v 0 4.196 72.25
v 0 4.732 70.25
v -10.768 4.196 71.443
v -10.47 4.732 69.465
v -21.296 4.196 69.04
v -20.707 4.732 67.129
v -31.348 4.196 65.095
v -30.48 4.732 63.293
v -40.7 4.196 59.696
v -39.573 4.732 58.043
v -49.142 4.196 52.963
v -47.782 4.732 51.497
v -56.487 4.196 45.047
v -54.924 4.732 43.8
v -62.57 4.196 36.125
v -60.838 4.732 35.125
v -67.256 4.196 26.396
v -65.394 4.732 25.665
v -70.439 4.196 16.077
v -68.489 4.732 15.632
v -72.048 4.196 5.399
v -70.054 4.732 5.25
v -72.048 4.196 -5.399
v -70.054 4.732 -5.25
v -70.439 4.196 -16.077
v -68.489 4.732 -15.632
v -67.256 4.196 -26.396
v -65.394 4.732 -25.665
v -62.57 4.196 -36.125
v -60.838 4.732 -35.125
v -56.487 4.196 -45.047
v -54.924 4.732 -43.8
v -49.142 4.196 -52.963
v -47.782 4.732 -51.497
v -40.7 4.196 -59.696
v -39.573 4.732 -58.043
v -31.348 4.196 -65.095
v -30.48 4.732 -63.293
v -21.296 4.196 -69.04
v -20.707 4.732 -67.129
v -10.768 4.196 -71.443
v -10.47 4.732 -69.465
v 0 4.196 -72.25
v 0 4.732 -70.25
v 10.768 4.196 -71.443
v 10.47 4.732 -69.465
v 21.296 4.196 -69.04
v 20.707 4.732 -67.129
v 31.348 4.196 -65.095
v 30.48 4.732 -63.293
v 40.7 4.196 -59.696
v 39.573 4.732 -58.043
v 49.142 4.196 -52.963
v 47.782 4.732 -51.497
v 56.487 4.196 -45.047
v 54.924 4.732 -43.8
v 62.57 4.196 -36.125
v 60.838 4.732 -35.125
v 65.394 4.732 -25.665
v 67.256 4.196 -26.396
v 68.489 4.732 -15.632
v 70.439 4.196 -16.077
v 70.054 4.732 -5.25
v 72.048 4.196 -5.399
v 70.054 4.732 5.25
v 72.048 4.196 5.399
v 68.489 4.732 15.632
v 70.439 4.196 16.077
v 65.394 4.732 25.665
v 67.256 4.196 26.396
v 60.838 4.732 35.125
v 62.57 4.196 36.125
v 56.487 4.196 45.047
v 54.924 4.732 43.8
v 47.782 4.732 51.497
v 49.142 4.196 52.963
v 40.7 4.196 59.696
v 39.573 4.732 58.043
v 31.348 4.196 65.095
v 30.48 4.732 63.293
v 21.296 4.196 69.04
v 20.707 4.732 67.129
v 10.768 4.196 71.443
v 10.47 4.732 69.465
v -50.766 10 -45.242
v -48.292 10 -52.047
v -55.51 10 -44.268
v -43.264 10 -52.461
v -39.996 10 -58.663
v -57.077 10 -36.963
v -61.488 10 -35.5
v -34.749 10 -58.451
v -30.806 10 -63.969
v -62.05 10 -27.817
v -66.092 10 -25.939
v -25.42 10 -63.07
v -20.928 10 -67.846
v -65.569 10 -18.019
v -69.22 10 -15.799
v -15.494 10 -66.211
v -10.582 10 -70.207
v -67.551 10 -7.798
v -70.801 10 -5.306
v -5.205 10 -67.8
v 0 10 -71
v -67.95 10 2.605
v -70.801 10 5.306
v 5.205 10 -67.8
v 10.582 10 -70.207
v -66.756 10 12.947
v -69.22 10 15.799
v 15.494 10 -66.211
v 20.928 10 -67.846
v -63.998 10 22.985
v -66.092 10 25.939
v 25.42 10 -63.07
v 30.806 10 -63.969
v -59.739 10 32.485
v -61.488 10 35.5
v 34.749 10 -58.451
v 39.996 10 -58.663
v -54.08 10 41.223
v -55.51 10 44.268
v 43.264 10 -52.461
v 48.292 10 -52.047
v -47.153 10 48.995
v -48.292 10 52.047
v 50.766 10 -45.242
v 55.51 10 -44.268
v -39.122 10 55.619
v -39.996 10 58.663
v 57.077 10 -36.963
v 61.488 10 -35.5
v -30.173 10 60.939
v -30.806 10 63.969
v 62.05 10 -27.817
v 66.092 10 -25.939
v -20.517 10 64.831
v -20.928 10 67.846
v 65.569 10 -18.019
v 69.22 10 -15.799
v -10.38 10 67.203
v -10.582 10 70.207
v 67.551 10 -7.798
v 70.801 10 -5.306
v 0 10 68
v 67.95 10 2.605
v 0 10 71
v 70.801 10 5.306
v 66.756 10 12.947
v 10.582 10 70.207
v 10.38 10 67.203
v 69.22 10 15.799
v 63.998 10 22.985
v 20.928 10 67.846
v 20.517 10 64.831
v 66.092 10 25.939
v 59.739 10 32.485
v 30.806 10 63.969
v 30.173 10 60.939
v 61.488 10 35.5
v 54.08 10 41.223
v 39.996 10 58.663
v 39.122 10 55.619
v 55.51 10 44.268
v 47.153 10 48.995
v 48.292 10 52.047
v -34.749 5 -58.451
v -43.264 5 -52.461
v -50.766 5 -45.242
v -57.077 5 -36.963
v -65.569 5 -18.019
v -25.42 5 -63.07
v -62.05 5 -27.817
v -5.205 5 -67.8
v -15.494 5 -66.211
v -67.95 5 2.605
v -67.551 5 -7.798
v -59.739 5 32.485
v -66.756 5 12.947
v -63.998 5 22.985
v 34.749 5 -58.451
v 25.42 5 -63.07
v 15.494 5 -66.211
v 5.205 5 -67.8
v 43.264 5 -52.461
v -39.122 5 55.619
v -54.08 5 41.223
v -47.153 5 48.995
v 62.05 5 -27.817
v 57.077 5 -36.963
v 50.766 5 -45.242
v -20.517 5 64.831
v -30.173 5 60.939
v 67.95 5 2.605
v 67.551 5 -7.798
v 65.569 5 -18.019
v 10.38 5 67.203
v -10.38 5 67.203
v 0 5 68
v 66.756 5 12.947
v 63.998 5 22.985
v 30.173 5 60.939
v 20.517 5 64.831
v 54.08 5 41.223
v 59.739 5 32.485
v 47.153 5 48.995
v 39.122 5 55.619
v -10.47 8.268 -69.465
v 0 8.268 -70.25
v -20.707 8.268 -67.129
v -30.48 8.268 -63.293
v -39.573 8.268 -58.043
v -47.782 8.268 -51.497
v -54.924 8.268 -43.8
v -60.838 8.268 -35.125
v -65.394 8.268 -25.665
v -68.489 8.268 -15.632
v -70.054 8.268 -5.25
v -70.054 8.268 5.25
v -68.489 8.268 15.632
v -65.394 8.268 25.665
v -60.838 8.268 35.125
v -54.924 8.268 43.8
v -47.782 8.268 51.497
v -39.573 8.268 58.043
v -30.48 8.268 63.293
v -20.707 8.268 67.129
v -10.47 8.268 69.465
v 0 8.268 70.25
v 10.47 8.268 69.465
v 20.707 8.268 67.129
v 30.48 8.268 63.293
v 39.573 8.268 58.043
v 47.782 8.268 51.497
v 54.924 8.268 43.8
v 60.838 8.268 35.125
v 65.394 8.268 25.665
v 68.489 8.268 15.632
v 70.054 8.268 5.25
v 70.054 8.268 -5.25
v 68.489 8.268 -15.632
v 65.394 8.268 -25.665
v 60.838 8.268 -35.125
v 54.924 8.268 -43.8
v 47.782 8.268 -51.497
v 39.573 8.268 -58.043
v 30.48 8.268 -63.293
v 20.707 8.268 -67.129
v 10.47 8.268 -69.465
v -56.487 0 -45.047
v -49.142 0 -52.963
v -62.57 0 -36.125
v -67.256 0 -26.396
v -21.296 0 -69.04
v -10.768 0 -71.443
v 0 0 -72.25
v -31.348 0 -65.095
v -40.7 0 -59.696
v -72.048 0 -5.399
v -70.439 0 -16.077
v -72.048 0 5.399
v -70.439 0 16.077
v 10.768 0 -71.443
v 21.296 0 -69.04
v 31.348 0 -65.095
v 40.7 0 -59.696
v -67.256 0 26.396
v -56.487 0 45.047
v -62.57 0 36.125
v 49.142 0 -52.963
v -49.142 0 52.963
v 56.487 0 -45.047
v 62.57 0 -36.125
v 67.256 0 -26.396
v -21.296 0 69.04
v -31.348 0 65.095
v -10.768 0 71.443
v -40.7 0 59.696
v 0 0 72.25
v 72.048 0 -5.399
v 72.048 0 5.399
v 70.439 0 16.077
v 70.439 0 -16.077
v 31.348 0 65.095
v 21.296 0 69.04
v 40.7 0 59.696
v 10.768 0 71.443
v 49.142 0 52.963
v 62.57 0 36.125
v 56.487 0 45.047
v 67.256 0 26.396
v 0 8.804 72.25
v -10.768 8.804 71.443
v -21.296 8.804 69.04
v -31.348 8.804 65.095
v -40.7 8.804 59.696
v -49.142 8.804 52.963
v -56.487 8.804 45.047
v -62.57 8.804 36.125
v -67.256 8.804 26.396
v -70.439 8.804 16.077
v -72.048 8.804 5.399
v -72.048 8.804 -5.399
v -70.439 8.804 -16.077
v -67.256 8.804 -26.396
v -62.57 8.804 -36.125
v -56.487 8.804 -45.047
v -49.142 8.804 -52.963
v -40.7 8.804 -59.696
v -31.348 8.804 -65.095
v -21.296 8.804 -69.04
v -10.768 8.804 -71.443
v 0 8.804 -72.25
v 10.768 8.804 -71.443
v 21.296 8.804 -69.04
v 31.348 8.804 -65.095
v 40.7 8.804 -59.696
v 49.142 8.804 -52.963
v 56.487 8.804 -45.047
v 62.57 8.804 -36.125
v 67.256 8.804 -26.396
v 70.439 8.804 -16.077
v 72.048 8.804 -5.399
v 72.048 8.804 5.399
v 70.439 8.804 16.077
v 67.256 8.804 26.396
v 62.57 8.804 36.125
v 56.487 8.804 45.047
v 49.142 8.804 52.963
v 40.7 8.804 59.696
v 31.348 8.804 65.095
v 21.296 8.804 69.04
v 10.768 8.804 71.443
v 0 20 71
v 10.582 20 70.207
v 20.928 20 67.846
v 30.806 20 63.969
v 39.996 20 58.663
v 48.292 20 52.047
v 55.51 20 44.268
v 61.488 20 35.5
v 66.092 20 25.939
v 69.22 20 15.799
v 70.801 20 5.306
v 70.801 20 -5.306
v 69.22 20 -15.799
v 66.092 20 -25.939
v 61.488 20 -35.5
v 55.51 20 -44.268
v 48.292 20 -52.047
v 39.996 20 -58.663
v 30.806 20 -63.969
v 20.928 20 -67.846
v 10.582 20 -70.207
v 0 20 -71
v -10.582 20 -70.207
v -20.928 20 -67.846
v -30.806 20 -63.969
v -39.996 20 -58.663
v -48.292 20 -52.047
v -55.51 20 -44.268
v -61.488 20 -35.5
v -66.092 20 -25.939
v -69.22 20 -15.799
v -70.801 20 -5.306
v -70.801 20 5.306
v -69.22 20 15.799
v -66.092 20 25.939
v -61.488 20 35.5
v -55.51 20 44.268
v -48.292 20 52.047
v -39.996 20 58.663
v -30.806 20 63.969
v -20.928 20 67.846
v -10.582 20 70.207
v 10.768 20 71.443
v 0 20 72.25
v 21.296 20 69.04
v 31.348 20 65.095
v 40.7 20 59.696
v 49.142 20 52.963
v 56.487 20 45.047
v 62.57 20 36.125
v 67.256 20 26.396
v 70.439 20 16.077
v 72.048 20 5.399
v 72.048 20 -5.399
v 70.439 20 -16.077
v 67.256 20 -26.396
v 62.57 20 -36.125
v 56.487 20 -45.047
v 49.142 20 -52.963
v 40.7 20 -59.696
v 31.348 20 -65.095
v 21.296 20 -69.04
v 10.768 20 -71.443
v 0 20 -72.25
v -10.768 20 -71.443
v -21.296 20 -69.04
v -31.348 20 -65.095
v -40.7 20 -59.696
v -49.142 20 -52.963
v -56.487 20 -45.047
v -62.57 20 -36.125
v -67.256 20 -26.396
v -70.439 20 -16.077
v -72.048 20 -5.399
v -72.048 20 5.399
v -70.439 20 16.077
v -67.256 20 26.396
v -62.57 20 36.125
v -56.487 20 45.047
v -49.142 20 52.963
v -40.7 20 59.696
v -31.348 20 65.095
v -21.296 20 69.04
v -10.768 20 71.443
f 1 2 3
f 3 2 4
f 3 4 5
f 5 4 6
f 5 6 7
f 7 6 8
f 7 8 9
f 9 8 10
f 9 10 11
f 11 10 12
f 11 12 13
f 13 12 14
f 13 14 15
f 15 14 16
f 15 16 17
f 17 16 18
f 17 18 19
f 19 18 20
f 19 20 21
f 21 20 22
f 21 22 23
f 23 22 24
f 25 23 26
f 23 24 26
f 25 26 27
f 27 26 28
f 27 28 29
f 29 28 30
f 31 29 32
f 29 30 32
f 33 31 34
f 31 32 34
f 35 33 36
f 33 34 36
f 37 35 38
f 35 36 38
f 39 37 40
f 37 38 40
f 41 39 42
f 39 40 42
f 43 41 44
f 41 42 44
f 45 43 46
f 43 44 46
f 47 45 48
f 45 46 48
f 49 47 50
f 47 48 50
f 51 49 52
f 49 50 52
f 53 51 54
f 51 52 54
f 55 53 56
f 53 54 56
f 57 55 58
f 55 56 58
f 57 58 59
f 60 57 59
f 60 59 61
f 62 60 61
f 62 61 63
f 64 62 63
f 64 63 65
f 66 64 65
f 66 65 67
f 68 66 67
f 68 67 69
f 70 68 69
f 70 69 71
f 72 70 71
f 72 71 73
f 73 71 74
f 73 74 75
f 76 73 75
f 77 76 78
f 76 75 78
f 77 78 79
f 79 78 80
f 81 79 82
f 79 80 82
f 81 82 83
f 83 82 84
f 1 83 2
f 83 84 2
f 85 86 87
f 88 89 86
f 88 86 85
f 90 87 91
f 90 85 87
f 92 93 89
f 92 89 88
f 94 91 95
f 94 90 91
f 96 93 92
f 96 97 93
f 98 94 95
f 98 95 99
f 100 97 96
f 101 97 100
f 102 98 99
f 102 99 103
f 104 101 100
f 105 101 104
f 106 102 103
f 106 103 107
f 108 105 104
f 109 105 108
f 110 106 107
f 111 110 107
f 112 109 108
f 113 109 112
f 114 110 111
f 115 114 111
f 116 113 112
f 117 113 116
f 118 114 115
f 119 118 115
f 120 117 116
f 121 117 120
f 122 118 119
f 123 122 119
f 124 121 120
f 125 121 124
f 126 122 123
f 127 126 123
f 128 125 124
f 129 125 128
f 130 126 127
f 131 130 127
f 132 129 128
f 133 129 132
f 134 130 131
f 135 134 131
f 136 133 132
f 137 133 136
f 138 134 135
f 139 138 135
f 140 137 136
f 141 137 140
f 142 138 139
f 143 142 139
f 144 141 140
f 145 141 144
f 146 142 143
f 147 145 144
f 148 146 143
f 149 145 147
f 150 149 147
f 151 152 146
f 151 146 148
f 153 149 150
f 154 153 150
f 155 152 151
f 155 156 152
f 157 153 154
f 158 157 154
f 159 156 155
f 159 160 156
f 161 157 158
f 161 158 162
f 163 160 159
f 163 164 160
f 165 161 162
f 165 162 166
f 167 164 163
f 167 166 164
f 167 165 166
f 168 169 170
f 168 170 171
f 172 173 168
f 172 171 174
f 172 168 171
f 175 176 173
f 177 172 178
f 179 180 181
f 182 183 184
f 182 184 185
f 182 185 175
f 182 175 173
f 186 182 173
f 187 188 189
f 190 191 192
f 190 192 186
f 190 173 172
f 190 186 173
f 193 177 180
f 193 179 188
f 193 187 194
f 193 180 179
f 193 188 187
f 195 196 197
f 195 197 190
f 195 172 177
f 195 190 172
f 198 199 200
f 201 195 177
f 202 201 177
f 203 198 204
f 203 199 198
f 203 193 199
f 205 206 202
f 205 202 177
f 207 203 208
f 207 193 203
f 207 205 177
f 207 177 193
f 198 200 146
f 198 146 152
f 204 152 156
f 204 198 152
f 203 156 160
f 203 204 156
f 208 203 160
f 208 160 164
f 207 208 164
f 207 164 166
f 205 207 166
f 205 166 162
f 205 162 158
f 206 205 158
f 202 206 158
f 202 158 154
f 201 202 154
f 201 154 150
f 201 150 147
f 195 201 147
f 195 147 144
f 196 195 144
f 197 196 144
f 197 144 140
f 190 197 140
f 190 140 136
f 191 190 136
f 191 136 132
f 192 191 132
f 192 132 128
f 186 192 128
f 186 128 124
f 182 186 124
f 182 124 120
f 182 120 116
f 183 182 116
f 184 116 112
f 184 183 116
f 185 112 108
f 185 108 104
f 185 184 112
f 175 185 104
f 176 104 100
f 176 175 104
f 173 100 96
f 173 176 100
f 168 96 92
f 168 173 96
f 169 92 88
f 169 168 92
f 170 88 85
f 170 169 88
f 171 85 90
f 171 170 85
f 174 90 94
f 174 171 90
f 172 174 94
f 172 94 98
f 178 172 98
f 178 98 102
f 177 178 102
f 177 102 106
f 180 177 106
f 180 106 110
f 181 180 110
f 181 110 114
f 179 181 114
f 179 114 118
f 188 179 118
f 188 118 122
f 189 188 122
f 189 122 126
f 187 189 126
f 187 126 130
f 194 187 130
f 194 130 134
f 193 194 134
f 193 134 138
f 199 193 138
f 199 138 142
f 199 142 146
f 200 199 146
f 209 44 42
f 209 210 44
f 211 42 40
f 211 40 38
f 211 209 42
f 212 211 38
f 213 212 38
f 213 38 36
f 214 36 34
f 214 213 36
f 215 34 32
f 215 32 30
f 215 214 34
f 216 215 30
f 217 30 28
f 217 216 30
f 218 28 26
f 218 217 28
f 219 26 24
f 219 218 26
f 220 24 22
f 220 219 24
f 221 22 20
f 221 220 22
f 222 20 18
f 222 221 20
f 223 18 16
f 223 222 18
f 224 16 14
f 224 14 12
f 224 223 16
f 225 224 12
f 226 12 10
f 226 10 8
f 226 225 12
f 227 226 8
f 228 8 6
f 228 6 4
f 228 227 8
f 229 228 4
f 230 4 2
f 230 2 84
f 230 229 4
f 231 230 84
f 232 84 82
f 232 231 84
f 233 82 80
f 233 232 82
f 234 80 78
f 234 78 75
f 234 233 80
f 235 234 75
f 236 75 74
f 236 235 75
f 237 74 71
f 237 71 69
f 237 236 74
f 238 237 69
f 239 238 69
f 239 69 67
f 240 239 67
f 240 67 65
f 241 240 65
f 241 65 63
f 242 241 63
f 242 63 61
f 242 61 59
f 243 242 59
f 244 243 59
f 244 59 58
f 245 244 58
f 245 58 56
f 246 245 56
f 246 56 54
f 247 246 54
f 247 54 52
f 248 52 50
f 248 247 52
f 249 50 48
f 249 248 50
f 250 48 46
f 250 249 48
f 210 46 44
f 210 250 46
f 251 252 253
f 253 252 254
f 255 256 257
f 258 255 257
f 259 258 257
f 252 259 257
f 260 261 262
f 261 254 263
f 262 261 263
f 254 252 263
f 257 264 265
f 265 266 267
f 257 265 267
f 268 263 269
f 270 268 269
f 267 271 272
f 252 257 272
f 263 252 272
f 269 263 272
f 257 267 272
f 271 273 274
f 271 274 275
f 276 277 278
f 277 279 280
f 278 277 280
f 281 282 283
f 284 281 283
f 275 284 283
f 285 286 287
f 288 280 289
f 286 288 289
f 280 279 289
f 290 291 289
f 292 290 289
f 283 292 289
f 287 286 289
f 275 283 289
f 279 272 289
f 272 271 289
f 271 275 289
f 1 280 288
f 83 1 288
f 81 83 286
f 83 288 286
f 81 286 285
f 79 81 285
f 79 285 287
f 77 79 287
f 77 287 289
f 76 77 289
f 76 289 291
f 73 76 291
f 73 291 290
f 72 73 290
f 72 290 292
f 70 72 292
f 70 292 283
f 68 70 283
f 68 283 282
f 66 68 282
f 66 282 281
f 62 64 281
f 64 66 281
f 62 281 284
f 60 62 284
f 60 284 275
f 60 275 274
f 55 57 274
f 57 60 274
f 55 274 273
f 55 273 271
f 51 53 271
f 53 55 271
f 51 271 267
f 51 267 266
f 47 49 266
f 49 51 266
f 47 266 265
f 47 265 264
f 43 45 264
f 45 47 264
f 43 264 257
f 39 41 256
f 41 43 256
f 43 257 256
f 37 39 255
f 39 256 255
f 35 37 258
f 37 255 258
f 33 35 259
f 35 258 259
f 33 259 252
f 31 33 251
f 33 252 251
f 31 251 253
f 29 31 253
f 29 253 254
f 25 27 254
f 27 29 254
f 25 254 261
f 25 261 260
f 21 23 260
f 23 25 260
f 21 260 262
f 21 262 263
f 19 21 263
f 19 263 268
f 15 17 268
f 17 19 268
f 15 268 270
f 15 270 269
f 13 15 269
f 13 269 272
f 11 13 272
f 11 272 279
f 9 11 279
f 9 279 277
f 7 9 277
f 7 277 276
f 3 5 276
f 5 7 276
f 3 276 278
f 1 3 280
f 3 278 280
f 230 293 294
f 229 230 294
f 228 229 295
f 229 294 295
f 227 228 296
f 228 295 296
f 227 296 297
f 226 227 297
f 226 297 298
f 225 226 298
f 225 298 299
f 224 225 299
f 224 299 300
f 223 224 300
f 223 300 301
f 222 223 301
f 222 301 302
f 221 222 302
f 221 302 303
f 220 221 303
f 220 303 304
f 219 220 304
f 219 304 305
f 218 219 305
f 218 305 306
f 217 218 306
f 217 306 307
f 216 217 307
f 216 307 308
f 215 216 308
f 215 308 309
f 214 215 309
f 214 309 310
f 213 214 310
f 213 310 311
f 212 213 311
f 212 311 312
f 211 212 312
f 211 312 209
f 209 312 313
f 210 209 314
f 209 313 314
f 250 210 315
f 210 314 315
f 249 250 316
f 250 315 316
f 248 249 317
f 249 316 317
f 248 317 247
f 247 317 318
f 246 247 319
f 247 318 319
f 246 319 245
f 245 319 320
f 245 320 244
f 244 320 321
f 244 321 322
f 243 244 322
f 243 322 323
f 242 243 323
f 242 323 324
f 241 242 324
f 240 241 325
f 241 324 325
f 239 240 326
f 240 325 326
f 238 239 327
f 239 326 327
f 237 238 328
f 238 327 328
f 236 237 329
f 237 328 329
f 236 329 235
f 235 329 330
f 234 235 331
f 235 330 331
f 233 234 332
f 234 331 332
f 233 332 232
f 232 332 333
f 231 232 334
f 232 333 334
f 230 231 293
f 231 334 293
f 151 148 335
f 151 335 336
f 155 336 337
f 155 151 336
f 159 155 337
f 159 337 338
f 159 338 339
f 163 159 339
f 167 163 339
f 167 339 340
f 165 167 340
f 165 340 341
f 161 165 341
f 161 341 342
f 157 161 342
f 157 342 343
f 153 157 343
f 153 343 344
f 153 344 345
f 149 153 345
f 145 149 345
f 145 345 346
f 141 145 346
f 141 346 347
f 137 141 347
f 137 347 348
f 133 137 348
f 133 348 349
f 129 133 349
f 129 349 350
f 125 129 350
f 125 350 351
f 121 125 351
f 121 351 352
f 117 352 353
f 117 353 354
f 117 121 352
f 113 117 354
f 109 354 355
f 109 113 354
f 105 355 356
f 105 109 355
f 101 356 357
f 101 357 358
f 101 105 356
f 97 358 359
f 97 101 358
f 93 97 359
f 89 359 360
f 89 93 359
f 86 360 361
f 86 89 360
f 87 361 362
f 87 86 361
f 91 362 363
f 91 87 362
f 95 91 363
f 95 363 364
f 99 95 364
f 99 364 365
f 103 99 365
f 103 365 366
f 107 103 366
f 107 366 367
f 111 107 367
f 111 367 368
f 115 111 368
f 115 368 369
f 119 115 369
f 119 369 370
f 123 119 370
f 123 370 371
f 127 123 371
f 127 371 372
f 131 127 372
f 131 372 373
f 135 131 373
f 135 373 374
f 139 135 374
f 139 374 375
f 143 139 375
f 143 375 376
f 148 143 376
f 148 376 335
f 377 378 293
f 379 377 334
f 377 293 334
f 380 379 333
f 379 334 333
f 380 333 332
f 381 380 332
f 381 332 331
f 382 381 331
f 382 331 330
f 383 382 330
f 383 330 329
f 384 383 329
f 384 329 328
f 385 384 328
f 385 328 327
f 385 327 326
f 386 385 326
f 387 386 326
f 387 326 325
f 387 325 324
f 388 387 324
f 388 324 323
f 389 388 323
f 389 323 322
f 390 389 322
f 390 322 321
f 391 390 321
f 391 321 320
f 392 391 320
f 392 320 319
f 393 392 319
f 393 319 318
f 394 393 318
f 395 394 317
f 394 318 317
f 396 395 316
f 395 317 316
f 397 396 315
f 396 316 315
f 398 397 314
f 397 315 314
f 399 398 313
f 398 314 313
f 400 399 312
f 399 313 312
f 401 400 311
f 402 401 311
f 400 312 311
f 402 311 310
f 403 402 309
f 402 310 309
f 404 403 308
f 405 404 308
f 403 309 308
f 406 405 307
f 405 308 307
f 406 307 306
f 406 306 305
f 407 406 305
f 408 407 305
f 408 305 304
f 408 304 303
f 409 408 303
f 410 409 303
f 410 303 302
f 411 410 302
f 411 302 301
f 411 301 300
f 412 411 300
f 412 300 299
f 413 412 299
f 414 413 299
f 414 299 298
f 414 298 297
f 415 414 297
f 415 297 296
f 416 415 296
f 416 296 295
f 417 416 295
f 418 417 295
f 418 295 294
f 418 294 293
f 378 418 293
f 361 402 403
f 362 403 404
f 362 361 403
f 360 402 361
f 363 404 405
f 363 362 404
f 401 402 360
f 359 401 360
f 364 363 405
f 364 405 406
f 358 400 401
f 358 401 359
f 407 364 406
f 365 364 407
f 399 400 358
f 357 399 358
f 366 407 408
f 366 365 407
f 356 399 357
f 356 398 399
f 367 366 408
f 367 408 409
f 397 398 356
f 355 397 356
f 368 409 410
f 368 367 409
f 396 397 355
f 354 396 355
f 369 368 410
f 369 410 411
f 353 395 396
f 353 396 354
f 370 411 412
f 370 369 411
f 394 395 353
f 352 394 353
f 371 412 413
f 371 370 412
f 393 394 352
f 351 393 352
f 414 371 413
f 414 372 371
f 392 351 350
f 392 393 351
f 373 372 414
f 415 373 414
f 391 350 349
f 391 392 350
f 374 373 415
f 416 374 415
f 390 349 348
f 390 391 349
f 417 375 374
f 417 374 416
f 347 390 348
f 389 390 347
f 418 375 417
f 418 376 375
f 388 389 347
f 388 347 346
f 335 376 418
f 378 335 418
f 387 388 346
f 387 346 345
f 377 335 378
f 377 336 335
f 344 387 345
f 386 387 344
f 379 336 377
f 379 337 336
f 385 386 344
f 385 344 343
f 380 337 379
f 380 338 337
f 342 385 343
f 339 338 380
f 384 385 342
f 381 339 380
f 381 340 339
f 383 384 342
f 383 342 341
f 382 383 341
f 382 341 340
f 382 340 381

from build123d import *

# Parameters (mm, degrees)
SKETCH_1_R       = 72.25
SKETCH_1_R_2     = 71
EXTRUDE_1_DEPTH  = 20
SKETCH_1_6_R     = 71
SKETCH_1_6_R_2   = 68
EXTRUDE_3_DEPTH  = 10
SKETCH_2_W       = 2
SKETCH_2_H       = 3
CHAMFER_1_SIZE   = 3
CHAMFER_1_SIZE_2 = 0.803847577
CHAMFER_2_SIZE   = 0.803847577
CHAMFER_2_SIZE_2 = 3
SKETCH_1_8_R     = 68
SKETCH_1_8_R_2   = 62.25
EXTRUDE_5_DEPTH  = 5


with BuildPart() as part:
    # 草圖1 → 填料-伸長1 (new body)
    with BuildSketch(Plane(origin=(0, 0, 0), x_dir=(1, 0, 0), z_dir=(0, 1, 0))):
        with Locations(Location((0, 0, 0), (0, 0, 270))):
            Circle(SKETCH_1_R)
        with Locations(Location((0, 0, 0), (0, 0, 270))):
            Circle(SKETCH_1_R_2, mode=Mode.SUBTRACT)
    extrude(amount=EXTRUDE_1_DEPTH)

    # 草圖1<6> → 填料-伸長3 (add)
    with BuildSketch(Plane(origin=(0, 0, 0), x_dir=(1, 0, 0), z_dir=(0, 1, 0))):
        with Locations(Location((0, 0, 0), (0, 0, 270))):
            Circle(SKETCH_1_6_R)
        with Locations(Location((0, 0, 0), (0, 0, 270))):
            Circle(SKETCH_1_6_R_2, mode=Mode.SUBTRACT)
    extrude(amount=EXTRUDE_3_DEPTH)

    # 草圖2 → 除料-旋轉1 (revolve, cut)
    with BuildSketch(Plane.XY, mode=Mode.PRIVATE) as cut_revolve_1_sk:
        with Locations((71.25, 6.5)):
            Rectangle(SKETCH_2_W, SKETCH_2_H)
    revolve(cut_revolve_1_sk.sketch.rotate(Axis((0, 0, 0), (0, 1, 0)), 90), axis=Axis((0, 0, 0), (0, 1, 0)), mode=Mode.SUBTRACT)

    # 導角1
    # the kernel refuses this chamfer: 3, 0.803847577 mm, written as the material it takes off along each edge
    with BuildSketch(Plane(origin=(0, 8, 0), x_dir=(0, 0, 1), z_dir=(1, 0, 0))) as chamfer_1_piece_1_section:
        Polygon((72.25 - CHAMFER_1_SIZE, 0), (72.25, -CHAMFER_1_SIZE_2), (72.25, 0), align=None)
    chamfer_1_piece_1 = revolve(axis=Axis((0, 8, 0), (0, -1, 0)), mode=Mode.PRIVATE)
    chamfer_1_piece_1 = chamfer_1_piece_1 - Plane(origin=(0, 8.471650201, 0), x_dir=(0, 0, -1), z_dir=(0, 1, 0)) * Cylinder(70.25, 289, mode=Mode.PRIVATE)
    add(chamfer_1_piece_1, mode=Mode.SUBTRACT)

    # 導角2
    # the kernel refuses this chamfer: 3, 0.803847577 mm, written as the material it takes off along each edge
    with BuildSketch(Plane(origin=(0, 5, 0), x_dir=(0, 0, 1), z_dir=(1, 0, 0))) as chamfer_2_piece_1_section:
        Polygon((72.25, CHAMFER_2_SIZE), (72.25 - CHAMFER_2_SIZE_2, 0), (72.25, 0), align=None)
    chamfer_2_piece_1 = revolve(axis=Axis((0, 5, 0), (0, -1, 0)), mode=Mode.PRIVATE)
    chamfer_2_piece_1 = chamfer_2_piece_1 - Plane(origin=(0, 4.528349799, 0), x_dir=(0, 0, -1), z_dir=(0, 1, 0)) * Cylinder(70.25, 289, mode=Mode.PRIVATE)
    add(chamfer_2_piece_1, mode=Mode.SUBTRACT)

    # 草圖1<8> → 填料-伸長5 (add)
    # profile 1 of 2: a face of its own
    with BuildSketch(Plane(origin=(0, 0, 0), x_dir=(1, 0, 0), z_dir=(0, 1, 0))):
        with Locations(Location((0, 0, 0), (0, 0, 270))):
            Circle(SKETCH_1_8_R)
        Circle(SKETCH_1_8_R_2, mode=Mode.SUBTRACT)
    # profile 2 of 2: a face of its own
    with BuildSketch(Plane(origin=(0, 0, 0), x_dir=(1, 0, 0), z_dir=(0, 1, 0))):
        Circle(SKETCH_1_8_R_2)
    extrude(amount=EXTRUDE_5_DEPTH)


solid = part.part
